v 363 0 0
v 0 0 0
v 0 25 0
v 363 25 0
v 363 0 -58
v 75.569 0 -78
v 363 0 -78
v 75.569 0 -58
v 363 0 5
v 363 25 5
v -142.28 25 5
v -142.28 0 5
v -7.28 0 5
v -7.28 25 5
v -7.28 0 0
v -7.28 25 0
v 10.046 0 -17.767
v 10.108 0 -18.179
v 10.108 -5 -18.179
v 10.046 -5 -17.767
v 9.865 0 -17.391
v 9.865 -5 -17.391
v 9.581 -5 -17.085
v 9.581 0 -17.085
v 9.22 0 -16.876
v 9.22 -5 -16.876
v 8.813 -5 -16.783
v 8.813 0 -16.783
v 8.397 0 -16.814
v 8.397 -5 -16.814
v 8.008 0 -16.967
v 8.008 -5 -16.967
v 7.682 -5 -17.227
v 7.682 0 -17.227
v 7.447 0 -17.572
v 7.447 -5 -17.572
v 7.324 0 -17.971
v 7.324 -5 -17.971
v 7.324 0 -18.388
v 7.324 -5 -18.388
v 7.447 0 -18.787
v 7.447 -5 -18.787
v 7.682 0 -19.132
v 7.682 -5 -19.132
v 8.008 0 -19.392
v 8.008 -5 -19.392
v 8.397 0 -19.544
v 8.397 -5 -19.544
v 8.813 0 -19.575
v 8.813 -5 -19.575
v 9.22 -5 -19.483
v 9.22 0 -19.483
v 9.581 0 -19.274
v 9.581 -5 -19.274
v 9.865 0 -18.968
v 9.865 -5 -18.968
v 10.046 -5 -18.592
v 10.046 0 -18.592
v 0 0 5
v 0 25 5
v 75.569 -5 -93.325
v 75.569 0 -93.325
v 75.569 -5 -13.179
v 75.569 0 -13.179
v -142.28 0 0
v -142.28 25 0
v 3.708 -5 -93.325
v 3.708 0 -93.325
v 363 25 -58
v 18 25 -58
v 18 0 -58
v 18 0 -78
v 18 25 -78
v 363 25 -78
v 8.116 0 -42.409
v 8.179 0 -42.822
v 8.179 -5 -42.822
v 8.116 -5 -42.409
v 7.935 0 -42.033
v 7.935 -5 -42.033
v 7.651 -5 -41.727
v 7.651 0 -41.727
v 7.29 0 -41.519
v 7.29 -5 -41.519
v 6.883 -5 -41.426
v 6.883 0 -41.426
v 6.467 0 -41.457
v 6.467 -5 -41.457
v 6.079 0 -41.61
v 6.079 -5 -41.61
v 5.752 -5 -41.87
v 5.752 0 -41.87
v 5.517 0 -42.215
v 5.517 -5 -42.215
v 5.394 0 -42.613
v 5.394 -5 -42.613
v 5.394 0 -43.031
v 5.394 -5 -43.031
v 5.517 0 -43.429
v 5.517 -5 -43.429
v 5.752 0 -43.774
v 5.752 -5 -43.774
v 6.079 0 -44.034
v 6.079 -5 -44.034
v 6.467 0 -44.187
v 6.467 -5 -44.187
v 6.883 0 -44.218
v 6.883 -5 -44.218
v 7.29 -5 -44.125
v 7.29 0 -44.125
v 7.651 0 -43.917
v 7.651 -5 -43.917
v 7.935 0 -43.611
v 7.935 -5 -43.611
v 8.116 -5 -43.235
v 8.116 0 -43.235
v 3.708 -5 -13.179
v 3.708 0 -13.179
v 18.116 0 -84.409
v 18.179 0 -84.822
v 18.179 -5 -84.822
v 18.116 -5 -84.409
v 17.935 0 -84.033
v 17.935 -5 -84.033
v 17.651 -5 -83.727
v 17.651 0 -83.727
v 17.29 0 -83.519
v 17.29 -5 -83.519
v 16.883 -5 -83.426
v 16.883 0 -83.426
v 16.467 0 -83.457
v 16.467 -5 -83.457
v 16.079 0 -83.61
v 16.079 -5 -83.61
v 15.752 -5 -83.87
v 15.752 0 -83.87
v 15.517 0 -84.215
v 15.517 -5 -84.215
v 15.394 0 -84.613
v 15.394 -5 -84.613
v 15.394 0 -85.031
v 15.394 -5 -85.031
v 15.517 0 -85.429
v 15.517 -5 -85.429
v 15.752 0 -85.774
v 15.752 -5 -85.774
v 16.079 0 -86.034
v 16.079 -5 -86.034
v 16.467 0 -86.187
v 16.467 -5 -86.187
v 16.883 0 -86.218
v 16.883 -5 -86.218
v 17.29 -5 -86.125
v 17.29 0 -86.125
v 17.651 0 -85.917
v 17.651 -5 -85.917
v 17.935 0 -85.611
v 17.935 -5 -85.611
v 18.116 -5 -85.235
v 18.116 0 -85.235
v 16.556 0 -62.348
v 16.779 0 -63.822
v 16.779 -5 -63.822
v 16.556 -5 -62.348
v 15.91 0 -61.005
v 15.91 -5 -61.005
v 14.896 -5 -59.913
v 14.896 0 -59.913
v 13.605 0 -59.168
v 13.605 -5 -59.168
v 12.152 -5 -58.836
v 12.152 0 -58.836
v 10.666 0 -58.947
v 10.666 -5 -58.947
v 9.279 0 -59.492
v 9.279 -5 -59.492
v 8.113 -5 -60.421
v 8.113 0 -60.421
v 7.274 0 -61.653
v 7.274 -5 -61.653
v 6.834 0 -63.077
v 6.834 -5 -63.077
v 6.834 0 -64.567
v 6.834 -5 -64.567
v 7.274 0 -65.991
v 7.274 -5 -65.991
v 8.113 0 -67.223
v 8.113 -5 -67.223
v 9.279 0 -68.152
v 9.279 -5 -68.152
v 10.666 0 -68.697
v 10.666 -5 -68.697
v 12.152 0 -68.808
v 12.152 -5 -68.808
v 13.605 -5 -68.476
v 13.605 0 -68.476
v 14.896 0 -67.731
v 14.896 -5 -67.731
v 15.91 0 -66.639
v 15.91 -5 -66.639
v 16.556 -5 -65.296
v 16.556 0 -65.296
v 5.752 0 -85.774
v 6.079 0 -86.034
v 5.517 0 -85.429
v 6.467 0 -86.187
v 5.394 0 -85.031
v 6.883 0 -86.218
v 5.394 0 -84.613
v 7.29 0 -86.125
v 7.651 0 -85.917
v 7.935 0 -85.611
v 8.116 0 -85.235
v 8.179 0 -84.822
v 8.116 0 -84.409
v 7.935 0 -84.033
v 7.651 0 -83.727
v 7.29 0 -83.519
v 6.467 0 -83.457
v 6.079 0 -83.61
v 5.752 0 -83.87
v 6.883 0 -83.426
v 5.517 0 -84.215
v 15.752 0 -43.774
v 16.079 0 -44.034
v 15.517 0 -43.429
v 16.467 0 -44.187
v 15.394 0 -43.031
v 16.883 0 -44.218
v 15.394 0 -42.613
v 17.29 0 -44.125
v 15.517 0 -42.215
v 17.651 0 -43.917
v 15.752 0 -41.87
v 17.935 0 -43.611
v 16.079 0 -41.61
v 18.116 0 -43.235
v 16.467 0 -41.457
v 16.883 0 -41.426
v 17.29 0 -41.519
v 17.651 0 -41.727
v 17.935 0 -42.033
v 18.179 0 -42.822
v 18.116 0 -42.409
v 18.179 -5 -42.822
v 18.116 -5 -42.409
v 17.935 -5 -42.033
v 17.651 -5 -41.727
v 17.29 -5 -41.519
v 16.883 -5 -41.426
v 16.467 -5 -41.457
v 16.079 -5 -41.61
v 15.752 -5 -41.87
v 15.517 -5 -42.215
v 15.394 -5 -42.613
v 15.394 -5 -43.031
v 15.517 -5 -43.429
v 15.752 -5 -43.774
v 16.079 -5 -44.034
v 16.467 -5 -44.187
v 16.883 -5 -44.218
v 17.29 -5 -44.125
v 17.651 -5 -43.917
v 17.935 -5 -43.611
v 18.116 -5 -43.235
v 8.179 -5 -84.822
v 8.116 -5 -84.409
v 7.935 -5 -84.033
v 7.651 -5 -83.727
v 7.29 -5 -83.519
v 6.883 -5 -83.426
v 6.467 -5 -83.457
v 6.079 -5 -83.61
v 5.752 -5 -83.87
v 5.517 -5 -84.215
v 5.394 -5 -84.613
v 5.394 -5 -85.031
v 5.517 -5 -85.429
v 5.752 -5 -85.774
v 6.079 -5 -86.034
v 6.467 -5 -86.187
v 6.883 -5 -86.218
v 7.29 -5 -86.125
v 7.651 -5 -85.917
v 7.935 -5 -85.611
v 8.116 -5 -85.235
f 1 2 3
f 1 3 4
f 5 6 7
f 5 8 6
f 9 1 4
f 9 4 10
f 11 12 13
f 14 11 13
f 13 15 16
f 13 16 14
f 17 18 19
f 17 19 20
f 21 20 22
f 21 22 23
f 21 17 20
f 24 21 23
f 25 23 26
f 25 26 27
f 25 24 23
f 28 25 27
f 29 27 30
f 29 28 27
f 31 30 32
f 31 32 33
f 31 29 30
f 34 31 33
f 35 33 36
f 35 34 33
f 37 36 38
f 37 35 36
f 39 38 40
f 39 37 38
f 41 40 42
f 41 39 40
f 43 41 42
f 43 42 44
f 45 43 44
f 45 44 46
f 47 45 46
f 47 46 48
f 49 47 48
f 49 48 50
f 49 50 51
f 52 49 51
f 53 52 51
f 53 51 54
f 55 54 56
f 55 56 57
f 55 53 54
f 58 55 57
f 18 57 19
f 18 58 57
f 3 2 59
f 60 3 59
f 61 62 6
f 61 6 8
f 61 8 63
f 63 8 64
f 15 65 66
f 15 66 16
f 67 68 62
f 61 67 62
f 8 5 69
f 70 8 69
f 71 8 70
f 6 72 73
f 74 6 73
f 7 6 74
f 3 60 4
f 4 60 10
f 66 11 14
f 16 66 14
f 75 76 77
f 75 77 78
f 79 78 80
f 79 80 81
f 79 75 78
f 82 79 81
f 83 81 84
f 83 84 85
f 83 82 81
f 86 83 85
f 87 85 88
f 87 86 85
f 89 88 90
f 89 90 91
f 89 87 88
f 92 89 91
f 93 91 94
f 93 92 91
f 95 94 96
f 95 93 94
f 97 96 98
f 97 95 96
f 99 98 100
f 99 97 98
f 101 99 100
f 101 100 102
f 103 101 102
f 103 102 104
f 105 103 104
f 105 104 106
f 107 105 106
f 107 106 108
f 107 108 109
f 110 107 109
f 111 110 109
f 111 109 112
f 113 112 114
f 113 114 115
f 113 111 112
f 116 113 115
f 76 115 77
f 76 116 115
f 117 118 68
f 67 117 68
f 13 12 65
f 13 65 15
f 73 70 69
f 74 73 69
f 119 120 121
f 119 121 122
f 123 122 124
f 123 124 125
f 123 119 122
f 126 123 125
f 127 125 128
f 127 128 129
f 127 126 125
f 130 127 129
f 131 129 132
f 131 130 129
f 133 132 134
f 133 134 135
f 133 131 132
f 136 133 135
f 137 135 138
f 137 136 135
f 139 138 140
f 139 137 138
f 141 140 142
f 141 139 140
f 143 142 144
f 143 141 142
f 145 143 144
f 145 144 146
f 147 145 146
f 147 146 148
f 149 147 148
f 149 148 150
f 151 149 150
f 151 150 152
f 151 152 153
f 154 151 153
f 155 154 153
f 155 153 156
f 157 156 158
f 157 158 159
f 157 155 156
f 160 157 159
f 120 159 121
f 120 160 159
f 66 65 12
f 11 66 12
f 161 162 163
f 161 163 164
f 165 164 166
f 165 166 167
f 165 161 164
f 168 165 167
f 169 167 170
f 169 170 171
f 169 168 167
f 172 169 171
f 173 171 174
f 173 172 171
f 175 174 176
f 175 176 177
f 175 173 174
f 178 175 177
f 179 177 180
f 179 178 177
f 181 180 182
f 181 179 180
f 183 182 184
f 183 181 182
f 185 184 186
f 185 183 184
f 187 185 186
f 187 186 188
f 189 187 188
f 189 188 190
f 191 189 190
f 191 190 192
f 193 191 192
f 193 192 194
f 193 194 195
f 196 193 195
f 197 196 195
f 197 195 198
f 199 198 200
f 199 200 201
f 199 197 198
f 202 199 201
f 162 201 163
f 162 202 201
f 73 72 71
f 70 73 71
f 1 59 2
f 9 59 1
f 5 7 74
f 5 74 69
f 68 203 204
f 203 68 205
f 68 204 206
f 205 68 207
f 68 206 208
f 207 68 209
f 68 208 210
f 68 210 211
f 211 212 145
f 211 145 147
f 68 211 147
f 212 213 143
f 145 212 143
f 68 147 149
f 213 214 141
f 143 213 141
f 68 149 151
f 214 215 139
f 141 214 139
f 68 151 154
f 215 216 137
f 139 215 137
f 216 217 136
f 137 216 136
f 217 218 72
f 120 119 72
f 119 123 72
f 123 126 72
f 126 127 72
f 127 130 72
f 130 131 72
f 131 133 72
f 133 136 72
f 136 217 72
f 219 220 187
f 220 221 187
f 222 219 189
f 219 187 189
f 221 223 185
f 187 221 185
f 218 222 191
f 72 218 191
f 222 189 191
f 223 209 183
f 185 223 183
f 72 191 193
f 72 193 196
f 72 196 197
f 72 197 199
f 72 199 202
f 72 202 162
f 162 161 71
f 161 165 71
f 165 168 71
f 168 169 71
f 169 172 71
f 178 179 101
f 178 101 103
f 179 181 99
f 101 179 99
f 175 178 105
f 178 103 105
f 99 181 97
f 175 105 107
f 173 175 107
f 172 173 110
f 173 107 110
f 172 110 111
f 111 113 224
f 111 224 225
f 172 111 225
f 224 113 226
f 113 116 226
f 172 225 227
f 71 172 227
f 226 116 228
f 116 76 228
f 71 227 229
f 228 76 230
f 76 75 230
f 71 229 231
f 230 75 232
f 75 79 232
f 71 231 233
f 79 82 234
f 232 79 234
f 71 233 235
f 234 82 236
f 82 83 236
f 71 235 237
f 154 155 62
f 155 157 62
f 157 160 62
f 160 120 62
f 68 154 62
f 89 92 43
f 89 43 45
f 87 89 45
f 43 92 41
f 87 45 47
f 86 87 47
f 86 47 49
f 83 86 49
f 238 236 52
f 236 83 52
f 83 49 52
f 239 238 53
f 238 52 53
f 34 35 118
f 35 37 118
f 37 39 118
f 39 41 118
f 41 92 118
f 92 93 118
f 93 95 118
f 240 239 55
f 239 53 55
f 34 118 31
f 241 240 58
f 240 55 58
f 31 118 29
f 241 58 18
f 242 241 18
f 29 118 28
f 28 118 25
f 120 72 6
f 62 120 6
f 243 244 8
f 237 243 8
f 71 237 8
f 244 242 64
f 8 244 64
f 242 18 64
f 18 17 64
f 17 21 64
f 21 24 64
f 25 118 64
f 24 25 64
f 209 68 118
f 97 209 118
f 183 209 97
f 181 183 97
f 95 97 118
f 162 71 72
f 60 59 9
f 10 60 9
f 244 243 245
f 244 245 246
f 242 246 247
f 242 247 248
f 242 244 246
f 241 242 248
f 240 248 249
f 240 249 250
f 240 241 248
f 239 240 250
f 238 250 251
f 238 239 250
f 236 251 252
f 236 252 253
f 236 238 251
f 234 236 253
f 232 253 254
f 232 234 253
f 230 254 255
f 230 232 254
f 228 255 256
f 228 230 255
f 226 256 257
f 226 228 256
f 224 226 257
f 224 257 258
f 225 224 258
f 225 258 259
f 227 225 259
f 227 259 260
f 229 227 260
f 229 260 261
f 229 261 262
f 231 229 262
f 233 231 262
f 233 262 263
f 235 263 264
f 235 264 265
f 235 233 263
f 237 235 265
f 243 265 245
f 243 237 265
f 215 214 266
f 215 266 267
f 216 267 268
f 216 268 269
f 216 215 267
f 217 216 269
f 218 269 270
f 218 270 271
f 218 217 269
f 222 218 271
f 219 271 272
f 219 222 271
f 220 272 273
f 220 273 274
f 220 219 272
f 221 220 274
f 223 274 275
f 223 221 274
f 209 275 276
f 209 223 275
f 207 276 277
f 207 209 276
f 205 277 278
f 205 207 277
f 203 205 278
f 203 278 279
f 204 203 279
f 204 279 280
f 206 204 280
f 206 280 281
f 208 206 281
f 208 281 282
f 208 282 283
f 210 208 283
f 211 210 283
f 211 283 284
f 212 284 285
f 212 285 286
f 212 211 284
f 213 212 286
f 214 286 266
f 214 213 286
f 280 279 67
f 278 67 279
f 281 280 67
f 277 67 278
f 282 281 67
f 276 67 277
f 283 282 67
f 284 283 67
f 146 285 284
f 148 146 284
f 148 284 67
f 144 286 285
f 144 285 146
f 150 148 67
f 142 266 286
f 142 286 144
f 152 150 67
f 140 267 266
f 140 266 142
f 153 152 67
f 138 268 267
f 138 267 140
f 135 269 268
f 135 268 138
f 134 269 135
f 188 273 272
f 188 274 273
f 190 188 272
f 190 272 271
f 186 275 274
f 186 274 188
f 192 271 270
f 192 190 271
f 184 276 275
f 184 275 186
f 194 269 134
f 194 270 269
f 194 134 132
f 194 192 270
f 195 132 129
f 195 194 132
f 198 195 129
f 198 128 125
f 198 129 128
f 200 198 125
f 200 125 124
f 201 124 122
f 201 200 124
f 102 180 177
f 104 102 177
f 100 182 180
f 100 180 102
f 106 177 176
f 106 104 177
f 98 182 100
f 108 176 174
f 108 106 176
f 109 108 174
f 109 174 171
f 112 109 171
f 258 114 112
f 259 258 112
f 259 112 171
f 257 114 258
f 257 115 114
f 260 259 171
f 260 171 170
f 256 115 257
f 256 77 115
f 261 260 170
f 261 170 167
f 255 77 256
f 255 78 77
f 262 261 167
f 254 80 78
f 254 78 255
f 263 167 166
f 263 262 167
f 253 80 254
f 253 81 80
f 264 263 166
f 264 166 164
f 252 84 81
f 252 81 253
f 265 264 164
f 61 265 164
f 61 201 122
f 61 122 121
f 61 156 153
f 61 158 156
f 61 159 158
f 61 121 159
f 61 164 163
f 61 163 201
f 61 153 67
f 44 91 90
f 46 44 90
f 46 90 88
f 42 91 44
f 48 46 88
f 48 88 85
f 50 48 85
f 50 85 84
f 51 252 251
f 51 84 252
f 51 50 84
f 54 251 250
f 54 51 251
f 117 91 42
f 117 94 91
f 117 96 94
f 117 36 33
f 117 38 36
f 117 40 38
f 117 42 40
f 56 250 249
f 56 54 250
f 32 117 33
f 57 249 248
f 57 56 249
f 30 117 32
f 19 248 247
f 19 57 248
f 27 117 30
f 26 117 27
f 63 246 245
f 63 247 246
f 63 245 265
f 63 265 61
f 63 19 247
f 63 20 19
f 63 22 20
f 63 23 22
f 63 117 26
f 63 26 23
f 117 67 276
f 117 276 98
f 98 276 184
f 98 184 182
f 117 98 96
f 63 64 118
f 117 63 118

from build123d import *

# Parameters (mm, degrees)
F0_R     = 1.4
F0_R_2   = 5
F0_W     = 20
F0_H     = 20
F0_W_2   = 37.5689805374
F1_DEPTH = 5
F0_W_3   = 135
F0_H_2   = 5
F2_DEPTH = 25
F0_W_4   = 363
F0_W_5   = 287.4310194626


with BuildPart() as f1:
    # F0 (on Front) → F1 (new body)
    with BuildSketch(Plane.XZ):
        Polygon((75.5689805374, -78), (38, -78), (18, -78), (18, -58), (38, -58), (75.5689805374, -58), (75.5689805374, -13.1792854732), (3.7081205519, -13.1792854732), (3.7081205519, -93.3250336647), (75.5689805374, -93.3250336647), align=None)
        with Locations((6.7785530165, -84.8219863176)):
            Circle(F0_R, mode=Mode.SUBTRACT)
        with Locations((16.7785530165, -84.8219863176)):
            Circle(F0_R, mode=Mode.SUBTRACT)
        with Locations((11.7785530165, -63.8219863176)):
            Circle(F0_R_2, mode=Mode.SUBTRACT)
        with Locations((6.7785530165, -42.8219863176)):
            Circle(F0_R, mode=Mode.SUBTRACT)
        with Locations((16.7785530165, -42.8219863176)):
            Circle(F0_R, mode=Mode.SUBTRACT)
        with Locations((8.7081205519, -18.1792854732)):
            Circle(F0_R, mode=Mode.SUBTRACT)
        with Locations((28, -68)):
            Rectangle(F0_W, F0_H)
        with Locations((56.7844902687, -68)):
            Rectangle(F0_W_2, F0_H)
    extrude(amount=F1_DEPTH)

    # F0 (on Front) → F2, piece 3 (join)
    with BuildSketch(Plane.XZ):
        with Locations((219.2844902687, -68)):
            Rectangle(F0_W_5, F0_H)
        with Locations((56.7844902687, -68)):
            Rectangle(F0_W_2, F0_H)
        with Locations((28, -68)):
            Rectangle(F0_W, F0_H)
    extrude(amount=-F2_DEPTH)


with BuildPart() as f2:
    # F0 (on Front) → F2 (new body)
    with BuildSketch(Plane.XZ):
        with Locations((-74.78, 2.5)):
            Rectangle(F0_W_3, F0_H_2)
    extrude(amount=-F2_DEPTH)


with BuildPart() as f2b:
    # F0 (on Front) → F2, piece 2 (new body)
    with BuildSketch(Plane.XZ):
        with Locations((181.5, 2.5)):
            Rectangle(F0_W_4, F0_H_2)
    extrude(amount=-F2_DEPTH)


solid = Compound([f1.part, f2.part, f2b.part])
